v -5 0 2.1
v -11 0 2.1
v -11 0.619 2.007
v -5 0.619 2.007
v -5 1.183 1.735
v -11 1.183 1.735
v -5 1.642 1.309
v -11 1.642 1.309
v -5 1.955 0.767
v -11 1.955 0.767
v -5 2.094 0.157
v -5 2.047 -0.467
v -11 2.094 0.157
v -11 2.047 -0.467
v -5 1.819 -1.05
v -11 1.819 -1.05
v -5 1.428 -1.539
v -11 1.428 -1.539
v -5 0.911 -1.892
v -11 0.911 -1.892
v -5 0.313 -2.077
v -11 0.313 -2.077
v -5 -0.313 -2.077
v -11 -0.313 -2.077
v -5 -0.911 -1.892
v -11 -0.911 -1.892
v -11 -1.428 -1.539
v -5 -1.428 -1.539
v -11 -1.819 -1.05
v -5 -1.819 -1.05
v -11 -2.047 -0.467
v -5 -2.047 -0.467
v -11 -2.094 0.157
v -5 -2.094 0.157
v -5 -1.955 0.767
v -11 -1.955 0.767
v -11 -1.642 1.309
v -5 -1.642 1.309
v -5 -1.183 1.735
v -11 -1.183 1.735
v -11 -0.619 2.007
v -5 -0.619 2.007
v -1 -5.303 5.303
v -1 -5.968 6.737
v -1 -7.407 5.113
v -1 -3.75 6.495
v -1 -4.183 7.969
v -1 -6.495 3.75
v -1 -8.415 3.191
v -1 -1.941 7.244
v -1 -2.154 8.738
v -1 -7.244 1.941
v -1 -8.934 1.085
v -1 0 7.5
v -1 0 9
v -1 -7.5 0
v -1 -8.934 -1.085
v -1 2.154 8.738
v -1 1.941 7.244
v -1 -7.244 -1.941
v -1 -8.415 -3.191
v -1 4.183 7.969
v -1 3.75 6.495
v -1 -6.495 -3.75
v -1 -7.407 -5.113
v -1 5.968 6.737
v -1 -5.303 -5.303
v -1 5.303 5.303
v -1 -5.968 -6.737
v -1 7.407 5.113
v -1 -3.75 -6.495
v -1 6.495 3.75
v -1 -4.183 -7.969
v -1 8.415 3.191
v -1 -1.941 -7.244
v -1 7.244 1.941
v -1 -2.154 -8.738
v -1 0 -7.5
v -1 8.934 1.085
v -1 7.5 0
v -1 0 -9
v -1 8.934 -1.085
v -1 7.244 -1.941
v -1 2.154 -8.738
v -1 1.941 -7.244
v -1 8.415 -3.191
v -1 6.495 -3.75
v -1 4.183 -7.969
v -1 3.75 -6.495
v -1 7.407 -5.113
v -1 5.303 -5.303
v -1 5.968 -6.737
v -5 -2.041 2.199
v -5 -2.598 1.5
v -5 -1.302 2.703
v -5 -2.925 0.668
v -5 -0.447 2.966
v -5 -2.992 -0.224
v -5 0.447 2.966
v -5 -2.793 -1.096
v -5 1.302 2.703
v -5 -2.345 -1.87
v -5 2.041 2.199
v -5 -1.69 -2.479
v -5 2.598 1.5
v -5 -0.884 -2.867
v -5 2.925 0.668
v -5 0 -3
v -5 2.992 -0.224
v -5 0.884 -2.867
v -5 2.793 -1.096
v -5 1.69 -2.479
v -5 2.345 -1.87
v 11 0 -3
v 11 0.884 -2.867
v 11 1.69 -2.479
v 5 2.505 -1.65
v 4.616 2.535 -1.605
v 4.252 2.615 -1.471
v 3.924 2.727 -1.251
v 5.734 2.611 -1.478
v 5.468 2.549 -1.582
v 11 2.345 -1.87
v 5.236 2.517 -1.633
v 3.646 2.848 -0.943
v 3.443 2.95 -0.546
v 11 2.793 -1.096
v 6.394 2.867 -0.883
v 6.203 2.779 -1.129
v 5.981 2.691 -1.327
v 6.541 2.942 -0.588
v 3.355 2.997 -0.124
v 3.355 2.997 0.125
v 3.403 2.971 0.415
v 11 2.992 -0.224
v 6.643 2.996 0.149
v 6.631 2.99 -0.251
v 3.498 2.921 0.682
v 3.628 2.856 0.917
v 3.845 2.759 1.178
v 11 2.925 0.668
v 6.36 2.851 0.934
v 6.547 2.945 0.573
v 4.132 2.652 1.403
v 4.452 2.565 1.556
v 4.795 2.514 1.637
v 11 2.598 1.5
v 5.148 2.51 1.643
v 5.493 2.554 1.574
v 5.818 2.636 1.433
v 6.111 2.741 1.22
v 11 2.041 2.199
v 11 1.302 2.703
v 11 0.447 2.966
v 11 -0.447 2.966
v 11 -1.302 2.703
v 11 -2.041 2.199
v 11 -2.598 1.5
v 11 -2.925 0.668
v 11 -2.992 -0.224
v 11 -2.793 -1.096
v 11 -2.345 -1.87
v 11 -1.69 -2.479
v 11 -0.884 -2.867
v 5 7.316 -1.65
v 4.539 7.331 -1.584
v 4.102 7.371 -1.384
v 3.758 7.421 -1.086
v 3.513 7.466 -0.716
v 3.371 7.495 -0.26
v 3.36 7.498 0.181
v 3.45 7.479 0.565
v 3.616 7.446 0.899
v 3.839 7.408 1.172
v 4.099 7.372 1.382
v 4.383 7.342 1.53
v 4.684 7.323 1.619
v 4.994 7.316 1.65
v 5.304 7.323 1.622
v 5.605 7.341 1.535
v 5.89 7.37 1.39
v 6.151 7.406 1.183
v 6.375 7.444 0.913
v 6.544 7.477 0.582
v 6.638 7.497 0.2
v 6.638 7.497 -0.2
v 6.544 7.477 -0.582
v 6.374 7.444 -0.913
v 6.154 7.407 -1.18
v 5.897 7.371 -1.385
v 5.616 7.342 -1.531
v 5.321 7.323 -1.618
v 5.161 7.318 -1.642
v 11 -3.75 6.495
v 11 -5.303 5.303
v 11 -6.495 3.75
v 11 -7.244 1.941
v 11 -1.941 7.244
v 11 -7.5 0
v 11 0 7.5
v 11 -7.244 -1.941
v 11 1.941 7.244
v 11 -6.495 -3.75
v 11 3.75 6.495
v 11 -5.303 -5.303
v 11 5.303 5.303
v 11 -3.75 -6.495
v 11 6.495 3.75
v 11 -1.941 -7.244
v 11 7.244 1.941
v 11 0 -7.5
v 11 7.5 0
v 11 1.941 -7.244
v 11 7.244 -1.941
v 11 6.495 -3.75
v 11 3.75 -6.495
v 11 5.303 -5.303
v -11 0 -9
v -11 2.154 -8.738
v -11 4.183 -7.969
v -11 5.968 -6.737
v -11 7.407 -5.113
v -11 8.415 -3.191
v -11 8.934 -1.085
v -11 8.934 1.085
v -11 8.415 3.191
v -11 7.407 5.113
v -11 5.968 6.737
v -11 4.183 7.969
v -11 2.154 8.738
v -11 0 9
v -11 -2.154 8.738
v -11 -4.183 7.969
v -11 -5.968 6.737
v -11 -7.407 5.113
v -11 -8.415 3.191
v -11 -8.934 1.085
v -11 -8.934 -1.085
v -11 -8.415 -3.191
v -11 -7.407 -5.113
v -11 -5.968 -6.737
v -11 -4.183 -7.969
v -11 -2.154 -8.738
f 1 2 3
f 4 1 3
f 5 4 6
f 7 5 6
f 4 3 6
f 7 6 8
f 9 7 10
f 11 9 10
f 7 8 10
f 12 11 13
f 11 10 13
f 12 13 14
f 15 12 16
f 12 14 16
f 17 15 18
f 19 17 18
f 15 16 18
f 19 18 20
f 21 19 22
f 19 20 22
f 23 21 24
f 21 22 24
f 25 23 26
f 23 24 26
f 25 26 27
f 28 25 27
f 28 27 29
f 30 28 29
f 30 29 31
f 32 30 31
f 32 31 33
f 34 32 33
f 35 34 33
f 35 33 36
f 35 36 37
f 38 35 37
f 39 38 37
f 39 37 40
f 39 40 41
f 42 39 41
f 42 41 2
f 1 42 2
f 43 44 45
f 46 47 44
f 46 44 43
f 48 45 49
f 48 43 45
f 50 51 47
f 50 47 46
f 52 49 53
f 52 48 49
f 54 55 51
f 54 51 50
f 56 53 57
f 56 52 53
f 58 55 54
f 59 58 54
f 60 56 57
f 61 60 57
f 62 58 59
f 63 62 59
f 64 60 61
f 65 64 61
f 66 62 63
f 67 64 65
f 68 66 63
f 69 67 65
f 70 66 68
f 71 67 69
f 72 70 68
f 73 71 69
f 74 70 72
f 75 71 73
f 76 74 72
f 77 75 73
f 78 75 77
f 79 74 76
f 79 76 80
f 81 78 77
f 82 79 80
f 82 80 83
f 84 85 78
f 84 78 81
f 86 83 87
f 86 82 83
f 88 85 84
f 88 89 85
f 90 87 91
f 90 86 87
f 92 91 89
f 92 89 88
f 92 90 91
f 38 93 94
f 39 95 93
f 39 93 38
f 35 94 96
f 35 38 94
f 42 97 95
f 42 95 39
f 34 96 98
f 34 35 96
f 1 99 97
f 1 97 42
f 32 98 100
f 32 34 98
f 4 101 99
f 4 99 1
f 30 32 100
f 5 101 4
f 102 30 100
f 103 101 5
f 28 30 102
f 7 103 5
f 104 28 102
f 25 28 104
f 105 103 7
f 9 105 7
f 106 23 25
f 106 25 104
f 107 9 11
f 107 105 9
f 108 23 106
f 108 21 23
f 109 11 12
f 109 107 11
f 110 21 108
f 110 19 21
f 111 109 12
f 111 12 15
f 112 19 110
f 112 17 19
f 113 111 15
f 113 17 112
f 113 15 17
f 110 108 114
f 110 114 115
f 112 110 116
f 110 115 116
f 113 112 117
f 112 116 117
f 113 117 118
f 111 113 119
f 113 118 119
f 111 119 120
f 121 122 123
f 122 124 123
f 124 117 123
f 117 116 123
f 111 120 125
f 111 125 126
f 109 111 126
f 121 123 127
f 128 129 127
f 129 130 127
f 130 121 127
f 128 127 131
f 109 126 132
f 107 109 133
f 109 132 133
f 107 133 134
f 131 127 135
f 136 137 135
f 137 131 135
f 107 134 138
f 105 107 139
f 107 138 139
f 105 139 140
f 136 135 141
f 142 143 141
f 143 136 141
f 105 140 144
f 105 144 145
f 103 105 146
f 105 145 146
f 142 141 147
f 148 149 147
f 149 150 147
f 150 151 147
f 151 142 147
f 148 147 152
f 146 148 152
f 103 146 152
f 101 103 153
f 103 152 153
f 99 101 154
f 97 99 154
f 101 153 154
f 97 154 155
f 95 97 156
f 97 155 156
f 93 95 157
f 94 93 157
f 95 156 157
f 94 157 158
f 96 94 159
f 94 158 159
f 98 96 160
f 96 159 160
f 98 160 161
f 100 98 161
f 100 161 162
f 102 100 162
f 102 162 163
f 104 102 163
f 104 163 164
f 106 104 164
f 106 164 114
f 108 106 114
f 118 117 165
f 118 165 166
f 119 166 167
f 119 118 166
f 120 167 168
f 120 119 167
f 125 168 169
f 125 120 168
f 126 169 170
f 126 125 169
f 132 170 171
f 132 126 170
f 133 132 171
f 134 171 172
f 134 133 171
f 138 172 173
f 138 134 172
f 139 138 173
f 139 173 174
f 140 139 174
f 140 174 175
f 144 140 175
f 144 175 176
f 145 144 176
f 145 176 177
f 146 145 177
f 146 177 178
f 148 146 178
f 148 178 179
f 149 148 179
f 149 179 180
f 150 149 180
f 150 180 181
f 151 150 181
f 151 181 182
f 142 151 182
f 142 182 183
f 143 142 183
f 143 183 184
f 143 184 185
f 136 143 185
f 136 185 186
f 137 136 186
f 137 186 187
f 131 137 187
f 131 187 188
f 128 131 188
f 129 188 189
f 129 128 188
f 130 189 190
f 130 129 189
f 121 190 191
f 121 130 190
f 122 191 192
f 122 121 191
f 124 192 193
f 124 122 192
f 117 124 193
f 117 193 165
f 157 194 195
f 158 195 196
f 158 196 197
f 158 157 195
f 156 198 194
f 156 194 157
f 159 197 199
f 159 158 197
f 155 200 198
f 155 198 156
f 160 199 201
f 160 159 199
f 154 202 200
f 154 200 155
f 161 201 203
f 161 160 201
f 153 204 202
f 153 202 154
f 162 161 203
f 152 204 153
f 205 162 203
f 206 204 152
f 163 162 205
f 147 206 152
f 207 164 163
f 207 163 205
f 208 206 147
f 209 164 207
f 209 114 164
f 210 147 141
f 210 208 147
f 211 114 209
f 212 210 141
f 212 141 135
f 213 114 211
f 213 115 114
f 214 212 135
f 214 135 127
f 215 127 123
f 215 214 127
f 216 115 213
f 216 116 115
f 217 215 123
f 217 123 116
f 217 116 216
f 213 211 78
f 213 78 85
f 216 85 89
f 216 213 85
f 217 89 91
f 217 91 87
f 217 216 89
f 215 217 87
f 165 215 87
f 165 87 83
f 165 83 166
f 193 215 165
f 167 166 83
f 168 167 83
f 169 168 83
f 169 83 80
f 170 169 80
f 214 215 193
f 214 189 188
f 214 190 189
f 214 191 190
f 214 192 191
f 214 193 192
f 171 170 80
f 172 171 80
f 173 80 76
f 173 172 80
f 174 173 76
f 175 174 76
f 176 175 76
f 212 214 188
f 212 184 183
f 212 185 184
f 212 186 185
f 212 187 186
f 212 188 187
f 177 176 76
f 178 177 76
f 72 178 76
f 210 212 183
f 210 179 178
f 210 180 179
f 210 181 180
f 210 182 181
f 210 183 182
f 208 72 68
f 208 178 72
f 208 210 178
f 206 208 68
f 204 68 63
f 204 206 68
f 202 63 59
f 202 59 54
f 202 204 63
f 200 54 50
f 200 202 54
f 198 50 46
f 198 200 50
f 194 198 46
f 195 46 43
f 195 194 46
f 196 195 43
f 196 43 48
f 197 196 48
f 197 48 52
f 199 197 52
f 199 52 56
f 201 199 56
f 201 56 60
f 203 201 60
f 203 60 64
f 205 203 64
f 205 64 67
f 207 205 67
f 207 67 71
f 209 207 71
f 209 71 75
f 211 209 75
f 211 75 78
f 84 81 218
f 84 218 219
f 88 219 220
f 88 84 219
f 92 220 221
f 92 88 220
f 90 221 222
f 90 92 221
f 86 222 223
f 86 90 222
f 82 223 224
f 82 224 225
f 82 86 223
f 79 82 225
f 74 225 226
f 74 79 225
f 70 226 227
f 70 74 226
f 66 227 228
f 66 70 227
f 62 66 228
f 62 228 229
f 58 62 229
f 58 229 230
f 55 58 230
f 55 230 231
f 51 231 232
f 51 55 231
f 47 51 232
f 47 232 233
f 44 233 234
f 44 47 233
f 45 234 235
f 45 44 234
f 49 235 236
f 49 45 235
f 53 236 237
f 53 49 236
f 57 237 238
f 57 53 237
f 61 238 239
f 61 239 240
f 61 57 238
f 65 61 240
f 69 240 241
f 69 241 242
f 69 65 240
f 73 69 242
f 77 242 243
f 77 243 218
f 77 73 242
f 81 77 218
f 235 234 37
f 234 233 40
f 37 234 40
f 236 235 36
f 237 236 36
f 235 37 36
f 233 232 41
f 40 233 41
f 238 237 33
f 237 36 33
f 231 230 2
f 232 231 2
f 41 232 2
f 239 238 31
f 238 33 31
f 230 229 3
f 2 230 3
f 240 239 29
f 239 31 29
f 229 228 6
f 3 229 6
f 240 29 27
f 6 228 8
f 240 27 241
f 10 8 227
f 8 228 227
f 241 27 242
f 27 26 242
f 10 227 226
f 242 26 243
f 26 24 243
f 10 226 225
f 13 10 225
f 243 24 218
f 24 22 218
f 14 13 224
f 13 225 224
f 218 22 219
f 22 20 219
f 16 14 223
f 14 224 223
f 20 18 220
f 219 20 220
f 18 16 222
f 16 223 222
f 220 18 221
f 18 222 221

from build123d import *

# Parameters (mm, degrees)
ESBO_O1_R                = 9
RESSALTO_EXTRUS_O1_DEPTH = 11
ESBO_O2_R                = 9
ESBO_O2_R_2              = 7.5
CORTE_EXTRUS_O1_DEPTH    = 12
ESBO_O3_R                = 3
CORTE_EXTRUS_O2_DEPTH    = 16
CORTE_EXTRUS_O3_REACH    = 27.417
ESBO_O4_R                = 2.1
ESBO_O8_R                = 1.65
CORTE_EXTRUS_O4_DEPTH    = 17.822603841


with BuildPart() as part:
    # Esboço1 → Ressalto-extrusão1 (new, symmetric)
    with BuildSketch(Plane(origin=(0, 0, 0), x_dir=(0, 0, -1), z_dir=(1, 0, 0))):
        Circle(ESBO_O1_R)
    extrude(amount=RESSALTO_EXTRUS_O1_DEPTH, both=True)

    # Esboço2 → Corte-extrusão1 (cut)
    with BuildSketch(Plane(origin=(11, 0, 0), x_dir=(0, 0, -1), z_dir=(1, 0, 0))):
        Circle(ESBO_O2_R)
        Circle(ESBO_O2_R_2, mode=Mode.SUBTRACT)
    extrude(amount=-CORTE_EXTRUS_O1_DEPTH, mode=Mode.SUBTRACT)

    # Esboço3 → Corte-extrusão2 (cut)
    with BuildSketch(Plane(origin=(11, 0, 0), x_dir=(0, 0, -1), z_dir=(1, 0, 0))):
        Circle(ESBO_O3_R)
    extrude(amount=-CORTE_EXTRUS_O2_DEPTH, mode=Mode.SUBTRACT)

    # Esboço4 → Corte-extrusão3 (cut, up to next)
    with BuildSketch(Plane.ZY.offset(11), mode=Mode.PRIVATE) as corte_extrus_o3_sk1:
        Circle(ESBO_O4_R)
    corte_extrus_o3_tool1 = extrude(corte_extrus_o3_sk1.sketch, amount=-CORTE_EXTRUS_O3_REACH, mode=Mode.PRIVATE) & part.part
    add(corte_extrus_o3_tool1.solids().sort_by_distance((-11, 0, 0))[0], mode=Mode.SUBTRACT)

    # Esboço8 → Corte-extrusão4 (cut, through all)
    with BuildSketch(Plane(origin=(0, 0, 0), x_dir=(1, 0, 0), z_dir=(0, 1, 0))):
        with Locations(Location((5, 0, 0), (0, 0, 90))):
            Circle(ESBO_O8_R)
    extrude(amount=CORTE_EXTRUS_O4_DEPTH, mode=Mode.SUBTRACT)


solid = part.part
